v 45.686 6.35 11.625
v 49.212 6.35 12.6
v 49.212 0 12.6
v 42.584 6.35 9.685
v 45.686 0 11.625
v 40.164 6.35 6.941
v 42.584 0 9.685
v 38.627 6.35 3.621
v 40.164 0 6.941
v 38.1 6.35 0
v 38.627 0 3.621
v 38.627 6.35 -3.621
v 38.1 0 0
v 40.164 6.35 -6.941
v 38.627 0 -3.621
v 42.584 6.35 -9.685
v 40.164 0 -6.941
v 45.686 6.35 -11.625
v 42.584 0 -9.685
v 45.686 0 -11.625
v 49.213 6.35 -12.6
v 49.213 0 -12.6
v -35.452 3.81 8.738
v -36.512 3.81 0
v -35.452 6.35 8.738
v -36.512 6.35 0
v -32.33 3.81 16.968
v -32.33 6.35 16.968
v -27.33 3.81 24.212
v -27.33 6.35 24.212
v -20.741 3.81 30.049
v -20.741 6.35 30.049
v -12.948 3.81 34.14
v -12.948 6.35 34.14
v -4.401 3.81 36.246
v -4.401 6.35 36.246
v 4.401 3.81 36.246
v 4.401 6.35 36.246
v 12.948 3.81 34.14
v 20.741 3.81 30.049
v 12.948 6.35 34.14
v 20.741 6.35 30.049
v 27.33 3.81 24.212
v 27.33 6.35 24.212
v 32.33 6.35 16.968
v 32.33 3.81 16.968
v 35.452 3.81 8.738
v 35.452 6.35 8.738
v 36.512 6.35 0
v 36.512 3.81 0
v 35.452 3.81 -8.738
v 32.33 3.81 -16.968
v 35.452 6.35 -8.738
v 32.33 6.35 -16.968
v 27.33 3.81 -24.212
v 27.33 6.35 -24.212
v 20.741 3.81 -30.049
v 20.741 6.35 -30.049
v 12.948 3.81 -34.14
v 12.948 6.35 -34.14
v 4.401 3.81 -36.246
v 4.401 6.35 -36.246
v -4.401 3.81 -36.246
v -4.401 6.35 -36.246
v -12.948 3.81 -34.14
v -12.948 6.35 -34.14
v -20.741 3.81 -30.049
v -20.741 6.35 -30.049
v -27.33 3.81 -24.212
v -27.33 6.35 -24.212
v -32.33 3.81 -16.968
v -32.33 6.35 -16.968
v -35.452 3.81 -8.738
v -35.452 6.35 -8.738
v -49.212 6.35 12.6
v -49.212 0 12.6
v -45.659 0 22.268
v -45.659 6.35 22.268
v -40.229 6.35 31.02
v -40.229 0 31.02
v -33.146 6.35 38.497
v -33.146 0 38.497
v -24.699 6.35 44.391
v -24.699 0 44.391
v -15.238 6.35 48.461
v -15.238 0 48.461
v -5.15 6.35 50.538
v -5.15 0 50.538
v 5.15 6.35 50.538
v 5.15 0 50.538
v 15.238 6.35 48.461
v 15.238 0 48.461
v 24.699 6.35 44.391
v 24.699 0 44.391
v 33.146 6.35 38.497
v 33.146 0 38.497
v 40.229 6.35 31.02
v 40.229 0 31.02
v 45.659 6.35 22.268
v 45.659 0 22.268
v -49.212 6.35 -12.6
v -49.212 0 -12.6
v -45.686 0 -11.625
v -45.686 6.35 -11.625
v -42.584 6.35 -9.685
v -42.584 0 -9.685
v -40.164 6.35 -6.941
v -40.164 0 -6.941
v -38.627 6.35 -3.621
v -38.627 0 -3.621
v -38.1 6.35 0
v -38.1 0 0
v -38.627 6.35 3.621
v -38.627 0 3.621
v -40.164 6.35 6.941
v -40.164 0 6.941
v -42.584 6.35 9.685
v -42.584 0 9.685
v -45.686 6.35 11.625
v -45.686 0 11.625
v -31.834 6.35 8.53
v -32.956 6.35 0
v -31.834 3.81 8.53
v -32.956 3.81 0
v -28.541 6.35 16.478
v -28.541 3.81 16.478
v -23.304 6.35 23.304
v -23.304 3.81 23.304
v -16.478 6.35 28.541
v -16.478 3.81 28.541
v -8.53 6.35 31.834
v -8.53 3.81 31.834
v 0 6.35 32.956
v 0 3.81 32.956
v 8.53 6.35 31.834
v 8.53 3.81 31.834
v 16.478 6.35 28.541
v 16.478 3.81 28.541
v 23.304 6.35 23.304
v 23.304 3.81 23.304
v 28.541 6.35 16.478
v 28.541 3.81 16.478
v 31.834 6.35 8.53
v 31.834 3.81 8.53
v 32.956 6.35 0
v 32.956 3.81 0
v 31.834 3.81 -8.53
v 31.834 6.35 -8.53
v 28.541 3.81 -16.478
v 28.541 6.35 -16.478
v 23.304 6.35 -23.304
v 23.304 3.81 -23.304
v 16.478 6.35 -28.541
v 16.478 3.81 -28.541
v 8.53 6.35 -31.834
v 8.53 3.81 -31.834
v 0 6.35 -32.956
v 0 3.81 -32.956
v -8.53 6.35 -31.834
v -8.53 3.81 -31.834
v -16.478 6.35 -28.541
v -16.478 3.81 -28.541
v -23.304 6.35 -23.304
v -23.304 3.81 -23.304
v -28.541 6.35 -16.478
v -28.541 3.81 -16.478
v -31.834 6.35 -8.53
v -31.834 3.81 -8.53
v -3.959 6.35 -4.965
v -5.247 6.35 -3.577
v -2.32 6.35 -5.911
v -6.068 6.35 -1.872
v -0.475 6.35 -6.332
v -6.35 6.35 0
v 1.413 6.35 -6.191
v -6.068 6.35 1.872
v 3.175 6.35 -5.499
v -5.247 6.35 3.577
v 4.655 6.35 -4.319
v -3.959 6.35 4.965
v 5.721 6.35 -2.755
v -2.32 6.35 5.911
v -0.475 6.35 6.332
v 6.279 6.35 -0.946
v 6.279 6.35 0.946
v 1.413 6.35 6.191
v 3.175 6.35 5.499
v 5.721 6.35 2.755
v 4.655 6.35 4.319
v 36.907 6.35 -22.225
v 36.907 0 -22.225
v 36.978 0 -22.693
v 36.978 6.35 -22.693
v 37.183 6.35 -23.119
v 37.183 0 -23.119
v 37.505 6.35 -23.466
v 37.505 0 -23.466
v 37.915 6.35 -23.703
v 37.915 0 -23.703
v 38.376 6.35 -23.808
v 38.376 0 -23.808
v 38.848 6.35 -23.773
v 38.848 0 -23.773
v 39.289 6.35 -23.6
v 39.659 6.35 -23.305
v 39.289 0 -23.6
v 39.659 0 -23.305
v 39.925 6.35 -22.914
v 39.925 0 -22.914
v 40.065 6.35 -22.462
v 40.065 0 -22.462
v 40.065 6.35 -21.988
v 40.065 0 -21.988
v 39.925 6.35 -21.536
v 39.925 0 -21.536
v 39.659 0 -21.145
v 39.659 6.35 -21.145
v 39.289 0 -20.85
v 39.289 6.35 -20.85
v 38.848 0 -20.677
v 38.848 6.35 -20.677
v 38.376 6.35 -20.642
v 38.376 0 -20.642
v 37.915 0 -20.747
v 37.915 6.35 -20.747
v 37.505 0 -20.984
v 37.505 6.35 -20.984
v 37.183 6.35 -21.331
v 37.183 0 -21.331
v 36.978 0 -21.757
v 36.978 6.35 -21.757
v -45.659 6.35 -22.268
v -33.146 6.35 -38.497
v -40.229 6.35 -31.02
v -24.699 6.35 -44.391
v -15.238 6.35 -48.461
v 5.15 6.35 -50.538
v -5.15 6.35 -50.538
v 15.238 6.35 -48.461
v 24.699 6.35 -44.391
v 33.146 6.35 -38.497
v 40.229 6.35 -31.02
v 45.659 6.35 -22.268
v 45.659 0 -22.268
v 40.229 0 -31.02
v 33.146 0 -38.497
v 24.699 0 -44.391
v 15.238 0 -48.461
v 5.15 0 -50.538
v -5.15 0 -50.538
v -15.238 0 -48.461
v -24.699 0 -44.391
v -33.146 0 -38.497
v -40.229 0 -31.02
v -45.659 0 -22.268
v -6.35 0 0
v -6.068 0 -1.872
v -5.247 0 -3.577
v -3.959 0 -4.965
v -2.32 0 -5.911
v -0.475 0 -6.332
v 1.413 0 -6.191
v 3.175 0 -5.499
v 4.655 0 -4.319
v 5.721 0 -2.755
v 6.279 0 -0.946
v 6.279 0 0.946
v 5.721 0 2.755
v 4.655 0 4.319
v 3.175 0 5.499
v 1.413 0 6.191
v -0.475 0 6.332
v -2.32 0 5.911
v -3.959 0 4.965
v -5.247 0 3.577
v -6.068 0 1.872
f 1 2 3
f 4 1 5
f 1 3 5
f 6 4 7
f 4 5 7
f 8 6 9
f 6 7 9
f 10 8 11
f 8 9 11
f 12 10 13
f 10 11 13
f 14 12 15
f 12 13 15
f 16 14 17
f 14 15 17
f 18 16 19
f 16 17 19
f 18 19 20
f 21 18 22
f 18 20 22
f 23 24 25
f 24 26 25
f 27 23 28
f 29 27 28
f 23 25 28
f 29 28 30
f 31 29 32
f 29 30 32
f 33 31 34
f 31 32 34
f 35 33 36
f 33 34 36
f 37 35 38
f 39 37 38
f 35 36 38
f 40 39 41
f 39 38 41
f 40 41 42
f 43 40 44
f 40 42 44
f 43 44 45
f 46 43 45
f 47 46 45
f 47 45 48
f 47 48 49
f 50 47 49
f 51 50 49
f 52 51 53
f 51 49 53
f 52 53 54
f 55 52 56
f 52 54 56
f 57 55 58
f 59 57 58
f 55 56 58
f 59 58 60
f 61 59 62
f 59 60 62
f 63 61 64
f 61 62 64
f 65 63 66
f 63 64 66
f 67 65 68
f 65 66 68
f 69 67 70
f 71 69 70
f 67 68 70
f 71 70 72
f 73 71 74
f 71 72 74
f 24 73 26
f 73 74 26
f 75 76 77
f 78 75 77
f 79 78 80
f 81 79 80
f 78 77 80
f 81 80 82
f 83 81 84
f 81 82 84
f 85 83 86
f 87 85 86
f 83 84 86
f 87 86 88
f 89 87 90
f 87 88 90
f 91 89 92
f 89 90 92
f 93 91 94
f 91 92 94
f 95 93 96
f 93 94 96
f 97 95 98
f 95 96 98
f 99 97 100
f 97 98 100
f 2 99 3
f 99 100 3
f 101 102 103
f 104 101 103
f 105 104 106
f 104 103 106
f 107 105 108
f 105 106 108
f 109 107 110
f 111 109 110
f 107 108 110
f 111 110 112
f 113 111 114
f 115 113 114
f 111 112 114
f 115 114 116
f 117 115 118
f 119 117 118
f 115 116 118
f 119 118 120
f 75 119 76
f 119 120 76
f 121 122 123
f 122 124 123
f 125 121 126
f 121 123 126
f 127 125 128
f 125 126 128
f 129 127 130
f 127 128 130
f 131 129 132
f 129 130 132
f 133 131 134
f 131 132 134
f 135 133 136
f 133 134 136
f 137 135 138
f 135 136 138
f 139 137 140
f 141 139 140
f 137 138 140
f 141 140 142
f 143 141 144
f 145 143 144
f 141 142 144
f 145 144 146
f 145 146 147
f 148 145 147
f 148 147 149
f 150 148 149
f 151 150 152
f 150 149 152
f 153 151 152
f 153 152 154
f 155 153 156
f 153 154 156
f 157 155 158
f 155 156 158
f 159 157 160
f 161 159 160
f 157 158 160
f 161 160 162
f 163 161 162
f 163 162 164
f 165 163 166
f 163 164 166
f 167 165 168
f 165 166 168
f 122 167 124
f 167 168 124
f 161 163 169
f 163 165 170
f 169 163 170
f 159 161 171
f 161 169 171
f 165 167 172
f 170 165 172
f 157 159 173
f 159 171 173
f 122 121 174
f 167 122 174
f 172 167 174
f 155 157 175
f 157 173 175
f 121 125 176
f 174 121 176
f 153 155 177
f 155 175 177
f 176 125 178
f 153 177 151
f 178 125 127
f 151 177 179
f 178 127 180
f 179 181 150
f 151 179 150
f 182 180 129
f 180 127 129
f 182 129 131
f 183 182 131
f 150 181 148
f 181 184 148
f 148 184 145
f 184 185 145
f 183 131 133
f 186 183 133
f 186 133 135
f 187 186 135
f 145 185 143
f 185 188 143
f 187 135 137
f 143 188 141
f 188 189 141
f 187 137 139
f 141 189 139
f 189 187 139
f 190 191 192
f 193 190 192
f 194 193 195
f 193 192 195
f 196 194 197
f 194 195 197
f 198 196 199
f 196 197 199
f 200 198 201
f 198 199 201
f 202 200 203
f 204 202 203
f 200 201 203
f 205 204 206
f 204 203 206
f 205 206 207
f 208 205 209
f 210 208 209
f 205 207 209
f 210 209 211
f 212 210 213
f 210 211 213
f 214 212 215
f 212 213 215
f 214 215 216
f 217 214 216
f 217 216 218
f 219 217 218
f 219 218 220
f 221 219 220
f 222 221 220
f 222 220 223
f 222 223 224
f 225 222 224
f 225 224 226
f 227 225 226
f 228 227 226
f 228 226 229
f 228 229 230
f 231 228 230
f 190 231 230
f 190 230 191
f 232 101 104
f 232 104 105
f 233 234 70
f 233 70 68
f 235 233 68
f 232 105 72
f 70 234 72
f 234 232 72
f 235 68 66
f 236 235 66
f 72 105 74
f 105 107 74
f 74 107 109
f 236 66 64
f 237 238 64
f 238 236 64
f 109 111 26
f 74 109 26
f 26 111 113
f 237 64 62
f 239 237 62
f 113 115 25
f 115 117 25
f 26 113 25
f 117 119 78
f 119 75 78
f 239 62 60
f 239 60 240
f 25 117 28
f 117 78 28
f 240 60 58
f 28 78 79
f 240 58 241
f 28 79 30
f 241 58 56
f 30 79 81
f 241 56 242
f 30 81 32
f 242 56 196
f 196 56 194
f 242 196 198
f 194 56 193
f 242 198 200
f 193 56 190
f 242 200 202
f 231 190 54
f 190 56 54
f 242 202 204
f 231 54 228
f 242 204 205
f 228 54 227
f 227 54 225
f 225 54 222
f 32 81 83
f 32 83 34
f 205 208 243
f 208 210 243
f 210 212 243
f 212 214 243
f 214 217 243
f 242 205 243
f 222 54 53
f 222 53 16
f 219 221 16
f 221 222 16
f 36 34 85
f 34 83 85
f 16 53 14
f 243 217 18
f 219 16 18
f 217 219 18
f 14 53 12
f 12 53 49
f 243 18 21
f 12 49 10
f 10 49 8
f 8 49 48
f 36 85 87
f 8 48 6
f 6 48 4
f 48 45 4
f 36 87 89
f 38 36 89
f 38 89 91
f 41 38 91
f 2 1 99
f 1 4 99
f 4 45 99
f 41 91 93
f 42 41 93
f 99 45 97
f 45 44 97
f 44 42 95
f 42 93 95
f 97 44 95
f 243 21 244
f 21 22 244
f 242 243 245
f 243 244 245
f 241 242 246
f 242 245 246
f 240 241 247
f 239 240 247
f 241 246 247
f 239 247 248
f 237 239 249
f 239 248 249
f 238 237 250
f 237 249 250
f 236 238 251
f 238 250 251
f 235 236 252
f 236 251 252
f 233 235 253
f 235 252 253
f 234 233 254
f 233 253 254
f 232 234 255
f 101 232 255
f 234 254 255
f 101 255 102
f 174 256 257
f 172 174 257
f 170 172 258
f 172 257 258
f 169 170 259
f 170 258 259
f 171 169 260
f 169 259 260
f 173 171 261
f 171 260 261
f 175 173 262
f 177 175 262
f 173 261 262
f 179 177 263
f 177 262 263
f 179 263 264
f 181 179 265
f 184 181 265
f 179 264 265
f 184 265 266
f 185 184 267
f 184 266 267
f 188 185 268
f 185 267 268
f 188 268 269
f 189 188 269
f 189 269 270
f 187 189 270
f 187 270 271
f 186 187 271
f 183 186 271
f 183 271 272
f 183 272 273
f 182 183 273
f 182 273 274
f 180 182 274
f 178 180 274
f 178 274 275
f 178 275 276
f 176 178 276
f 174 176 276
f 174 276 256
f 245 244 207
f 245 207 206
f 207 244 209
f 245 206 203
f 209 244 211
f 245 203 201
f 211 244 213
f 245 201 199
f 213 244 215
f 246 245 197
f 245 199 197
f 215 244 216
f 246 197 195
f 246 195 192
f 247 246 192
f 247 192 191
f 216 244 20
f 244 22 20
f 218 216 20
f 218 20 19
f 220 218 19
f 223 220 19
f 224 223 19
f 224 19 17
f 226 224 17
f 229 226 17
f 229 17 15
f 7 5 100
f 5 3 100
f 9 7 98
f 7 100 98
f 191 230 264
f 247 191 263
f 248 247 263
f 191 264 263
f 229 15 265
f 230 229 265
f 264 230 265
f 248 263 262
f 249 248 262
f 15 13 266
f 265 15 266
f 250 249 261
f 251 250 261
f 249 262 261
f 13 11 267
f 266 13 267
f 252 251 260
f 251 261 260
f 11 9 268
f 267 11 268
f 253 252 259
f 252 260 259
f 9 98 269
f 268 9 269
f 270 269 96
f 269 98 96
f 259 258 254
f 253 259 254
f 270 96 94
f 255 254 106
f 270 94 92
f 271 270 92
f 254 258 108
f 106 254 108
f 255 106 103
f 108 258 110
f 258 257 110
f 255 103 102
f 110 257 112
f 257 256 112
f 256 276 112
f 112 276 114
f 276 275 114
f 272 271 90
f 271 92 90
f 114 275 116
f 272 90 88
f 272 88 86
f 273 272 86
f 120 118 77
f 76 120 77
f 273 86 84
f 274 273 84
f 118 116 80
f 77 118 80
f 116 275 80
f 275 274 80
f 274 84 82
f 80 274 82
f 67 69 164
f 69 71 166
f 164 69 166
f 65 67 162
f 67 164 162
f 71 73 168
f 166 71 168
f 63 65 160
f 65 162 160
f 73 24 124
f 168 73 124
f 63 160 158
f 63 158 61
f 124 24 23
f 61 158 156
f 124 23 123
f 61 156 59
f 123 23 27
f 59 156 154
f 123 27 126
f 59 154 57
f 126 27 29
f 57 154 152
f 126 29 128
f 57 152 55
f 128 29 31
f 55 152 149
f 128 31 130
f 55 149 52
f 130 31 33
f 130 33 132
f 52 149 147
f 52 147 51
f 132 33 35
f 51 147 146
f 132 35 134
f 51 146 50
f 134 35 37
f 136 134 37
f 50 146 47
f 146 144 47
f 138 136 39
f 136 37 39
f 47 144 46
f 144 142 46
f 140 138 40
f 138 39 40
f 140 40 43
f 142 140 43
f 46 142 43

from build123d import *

# Parameters (mm, degrees)
F_1_2_0_5_DIAMETER_HOLE1_D   = 12.7
F_1_1_DIAMETER_HOLE1_D       = 25.4
F_1_8_0_125_DIAMETER_HOLE1_D = 3.175


with BuildPart() as part:
    # Sketch1 → Revolve1 (revolve)
    with BuildSketch(Plane.XY):
        Polygon((-32.9565, 6.35), (-32.9565, 3.81), (-36.5125, 3.81), (-36.5125, 6.35), (-50.8, 6.35), (-50.8, 0), (0, 0), (0, 6.35), align=None)
    revolve(axis=Axis((0, 0, 0), (0, 1, 0)))

    # 1/2 (0.5) Diameter Hole1 (through all)
    with Locations(Plane(origin=(0, 6.35, 0), x_dir=(1, 0, 0), z_dir=(0, 1, 0))):
        with Locations((0, 0)):
            Hole(F_1_2_0_5_DIAMETER_HOLE1_D / 2)

    # 1 (1) Diameter Hole1 (through all)
    with Locations(Plane(origin=(0, 6.35, 0), x_dir=(1, 0, 0), z_dir=(0, 1, 0))):
        with Locations((50.8, 0), (-50.8, 0)):
            Hole(F_1_1_DIAMETER_HOLE1_D / 2)

    # 1/8 (0.125) Diameter Hole1 (through all)
    with Locations(Plane(origin=(0, 6.35, 0), x_dir=(1, 0, 0), z_dir=(0, 1, 0))):
        with Locations((38.494829198, 22.225)):
            Hole(F_1_8_0_125_DIAMETER_HOLE1_D / 2)


solid = part.part
